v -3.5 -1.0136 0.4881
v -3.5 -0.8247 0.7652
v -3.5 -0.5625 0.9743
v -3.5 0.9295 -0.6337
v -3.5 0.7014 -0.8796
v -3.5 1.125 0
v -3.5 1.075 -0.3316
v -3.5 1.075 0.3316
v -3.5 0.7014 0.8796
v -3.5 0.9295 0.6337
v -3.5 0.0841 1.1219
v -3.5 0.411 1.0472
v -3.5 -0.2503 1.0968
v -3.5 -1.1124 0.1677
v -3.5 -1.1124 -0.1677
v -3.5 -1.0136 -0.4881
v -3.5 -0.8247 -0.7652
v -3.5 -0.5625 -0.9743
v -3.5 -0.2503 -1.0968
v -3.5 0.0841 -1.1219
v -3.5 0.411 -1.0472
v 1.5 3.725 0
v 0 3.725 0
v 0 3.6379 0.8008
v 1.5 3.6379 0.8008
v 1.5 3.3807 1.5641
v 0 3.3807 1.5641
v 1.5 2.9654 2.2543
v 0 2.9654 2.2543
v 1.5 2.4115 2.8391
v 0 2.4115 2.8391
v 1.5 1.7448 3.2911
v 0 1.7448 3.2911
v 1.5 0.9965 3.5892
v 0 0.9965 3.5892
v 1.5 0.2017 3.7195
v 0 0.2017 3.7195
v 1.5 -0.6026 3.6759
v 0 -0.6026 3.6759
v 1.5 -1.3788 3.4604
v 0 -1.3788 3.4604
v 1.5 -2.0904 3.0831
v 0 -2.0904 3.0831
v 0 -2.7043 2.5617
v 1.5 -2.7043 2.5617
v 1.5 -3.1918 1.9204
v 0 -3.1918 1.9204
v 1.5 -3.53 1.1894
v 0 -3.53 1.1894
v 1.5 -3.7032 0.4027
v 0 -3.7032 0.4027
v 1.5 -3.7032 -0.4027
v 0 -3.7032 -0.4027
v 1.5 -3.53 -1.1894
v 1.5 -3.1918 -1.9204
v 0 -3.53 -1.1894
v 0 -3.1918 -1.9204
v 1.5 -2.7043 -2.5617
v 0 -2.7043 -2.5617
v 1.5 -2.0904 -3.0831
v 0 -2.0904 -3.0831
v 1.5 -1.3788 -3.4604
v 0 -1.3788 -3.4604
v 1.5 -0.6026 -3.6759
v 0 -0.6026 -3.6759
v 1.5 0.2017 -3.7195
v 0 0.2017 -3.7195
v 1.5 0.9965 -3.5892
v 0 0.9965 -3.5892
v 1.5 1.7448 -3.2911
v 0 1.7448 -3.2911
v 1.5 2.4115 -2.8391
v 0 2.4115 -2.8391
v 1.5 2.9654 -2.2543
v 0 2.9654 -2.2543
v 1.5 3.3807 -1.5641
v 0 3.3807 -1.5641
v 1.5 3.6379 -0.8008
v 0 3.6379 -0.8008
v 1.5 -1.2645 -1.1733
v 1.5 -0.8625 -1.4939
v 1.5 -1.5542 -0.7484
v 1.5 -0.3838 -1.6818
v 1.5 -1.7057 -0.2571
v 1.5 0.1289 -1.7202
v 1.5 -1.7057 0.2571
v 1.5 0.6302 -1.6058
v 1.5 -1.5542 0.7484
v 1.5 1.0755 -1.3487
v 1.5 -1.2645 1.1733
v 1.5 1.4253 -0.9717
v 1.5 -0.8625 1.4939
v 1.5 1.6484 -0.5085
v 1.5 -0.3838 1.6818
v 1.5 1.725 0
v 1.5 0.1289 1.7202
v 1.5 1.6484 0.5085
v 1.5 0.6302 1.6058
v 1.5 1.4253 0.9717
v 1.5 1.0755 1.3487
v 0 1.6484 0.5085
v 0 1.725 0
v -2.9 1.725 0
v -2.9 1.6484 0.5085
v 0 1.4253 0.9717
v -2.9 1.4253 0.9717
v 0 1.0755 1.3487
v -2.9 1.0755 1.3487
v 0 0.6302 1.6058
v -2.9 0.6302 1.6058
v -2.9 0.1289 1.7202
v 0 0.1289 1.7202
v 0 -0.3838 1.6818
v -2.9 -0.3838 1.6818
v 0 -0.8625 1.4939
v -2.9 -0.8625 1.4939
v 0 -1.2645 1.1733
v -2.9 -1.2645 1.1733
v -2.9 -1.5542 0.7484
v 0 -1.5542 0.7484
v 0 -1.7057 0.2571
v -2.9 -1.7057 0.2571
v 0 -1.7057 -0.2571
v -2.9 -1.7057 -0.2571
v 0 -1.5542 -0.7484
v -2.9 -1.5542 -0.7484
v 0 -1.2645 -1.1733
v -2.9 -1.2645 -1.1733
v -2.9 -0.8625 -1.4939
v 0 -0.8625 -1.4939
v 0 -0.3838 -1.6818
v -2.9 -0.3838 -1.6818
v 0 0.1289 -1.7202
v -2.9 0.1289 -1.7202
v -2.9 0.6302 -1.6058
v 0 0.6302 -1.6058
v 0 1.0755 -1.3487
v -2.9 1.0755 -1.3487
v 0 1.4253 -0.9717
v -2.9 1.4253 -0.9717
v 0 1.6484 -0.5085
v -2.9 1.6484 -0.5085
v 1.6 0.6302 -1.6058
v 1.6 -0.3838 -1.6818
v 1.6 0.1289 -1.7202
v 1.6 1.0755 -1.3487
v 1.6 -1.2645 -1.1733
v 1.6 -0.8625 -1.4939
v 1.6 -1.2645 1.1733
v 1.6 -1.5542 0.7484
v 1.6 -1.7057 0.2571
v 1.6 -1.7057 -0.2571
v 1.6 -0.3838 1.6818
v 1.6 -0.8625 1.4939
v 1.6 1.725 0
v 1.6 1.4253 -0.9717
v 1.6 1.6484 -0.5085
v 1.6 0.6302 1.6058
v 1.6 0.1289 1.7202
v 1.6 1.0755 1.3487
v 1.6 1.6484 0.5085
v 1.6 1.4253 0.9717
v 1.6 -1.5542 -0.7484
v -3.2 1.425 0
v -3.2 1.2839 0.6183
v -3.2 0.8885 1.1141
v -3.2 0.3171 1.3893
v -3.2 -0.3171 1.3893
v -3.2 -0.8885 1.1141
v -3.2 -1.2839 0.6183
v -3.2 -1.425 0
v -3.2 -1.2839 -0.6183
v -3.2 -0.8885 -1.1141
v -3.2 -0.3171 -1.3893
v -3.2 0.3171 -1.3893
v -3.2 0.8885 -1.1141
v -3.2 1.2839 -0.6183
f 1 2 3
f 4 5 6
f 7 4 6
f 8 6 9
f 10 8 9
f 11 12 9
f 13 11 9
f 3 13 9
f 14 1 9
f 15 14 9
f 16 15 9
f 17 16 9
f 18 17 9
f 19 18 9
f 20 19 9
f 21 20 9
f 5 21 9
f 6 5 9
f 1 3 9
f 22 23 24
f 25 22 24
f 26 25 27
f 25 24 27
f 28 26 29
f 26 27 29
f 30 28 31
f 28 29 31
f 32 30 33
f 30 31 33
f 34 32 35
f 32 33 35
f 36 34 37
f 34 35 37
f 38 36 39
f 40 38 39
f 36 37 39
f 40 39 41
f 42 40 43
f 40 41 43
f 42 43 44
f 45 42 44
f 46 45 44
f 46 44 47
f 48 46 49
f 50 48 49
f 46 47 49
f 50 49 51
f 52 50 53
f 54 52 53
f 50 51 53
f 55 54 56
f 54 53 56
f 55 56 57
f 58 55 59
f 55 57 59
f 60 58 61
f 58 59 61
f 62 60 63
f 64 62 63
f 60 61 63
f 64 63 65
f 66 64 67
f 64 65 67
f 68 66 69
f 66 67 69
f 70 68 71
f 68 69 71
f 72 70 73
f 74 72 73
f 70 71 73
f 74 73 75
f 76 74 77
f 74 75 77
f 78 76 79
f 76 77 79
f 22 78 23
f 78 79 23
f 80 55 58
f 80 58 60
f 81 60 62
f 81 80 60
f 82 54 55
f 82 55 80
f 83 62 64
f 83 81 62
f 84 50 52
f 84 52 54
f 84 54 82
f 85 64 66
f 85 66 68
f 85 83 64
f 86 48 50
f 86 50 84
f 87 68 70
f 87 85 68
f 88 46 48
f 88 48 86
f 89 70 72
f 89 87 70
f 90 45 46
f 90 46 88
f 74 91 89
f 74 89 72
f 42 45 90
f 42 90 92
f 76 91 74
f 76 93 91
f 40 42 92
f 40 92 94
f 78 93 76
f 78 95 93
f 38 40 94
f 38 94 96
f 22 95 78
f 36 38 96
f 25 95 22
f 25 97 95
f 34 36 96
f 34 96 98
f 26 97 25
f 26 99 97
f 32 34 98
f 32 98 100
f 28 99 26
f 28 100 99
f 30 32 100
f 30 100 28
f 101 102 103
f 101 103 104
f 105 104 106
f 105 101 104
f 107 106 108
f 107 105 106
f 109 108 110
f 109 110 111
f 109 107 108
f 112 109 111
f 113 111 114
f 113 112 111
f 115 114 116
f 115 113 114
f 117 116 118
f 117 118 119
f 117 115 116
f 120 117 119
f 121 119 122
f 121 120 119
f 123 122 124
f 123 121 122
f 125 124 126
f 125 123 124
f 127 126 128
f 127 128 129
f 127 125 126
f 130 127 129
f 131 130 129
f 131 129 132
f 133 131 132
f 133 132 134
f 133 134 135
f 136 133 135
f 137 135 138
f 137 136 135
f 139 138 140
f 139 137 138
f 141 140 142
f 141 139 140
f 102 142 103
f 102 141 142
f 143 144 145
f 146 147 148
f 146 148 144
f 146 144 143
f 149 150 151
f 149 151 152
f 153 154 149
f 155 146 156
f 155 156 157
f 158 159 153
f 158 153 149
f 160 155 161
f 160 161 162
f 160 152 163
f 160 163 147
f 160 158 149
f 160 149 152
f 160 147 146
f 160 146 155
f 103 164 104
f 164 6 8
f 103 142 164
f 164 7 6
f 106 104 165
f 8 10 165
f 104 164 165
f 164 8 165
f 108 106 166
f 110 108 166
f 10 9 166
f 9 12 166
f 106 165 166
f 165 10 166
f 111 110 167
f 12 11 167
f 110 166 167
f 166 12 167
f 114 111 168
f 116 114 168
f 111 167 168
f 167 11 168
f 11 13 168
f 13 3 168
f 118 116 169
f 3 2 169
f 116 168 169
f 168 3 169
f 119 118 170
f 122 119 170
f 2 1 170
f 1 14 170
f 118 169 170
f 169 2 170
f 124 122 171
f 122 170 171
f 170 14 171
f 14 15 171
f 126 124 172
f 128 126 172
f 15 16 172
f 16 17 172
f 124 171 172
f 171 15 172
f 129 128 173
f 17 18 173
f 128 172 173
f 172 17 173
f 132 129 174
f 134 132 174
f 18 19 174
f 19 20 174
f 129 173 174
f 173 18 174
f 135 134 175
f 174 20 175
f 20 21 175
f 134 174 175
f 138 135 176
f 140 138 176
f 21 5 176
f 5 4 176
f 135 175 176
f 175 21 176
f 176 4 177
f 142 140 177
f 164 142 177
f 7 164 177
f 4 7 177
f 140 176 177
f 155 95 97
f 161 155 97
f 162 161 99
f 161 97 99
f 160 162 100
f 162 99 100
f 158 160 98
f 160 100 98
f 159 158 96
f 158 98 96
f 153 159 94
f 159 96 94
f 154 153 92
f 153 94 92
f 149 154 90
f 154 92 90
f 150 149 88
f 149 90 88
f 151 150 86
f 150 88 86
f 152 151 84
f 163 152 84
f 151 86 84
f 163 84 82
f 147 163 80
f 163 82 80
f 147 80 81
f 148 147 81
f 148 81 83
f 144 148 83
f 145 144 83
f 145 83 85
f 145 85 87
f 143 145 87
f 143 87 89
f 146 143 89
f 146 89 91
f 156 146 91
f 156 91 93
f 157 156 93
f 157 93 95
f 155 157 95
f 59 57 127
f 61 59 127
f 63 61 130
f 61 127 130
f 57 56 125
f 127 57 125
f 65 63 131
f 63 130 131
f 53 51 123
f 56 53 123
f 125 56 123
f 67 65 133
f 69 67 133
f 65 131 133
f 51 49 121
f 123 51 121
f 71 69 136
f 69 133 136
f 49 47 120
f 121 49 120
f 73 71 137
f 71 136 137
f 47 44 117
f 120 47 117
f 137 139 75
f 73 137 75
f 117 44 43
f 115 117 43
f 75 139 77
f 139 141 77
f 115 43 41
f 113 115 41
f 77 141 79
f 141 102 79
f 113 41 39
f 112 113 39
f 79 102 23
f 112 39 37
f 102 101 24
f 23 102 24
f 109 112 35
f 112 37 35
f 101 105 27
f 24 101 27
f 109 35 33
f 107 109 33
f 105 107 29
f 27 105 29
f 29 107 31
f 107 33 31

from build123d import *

# Parameters (mm, degrees)
F0_R     = 3.725
F1_DEPTH = 1.5
F2_R     = 1.725
F3_DEPTH = 3.5
F4_R     = 1.725
F5_DEPTH = 1.6
F6_SIZE  = 0.6


with BuildPart() as f1:
    # F0 (on Right) → F1 (new body)
    with BuildSketch(Plane.YZ):
        Circle(F0_R)
    extrude(amount=F1_DEPTH)

    # F2 (on Right) → F3 (join)
    with BuildSketch(Plane.YZ):
        Circle(F2_R)
    extrude(amount=-F3_DEPTH)

    # F4 (on Right) → F5 (join)
    with BuildSketch(Plane.YZ):
        Circle(F4_R)
    extrude(amount=F5_DEPTH)

    # F6
    f6_edges = [f1.edges().sort_by_distance(p)[0] for p in [
        (-3.5, -1.725, 0),
    ]]
    chamfer(f6_edges, length=F6_SIZE)


solid = f1.part
